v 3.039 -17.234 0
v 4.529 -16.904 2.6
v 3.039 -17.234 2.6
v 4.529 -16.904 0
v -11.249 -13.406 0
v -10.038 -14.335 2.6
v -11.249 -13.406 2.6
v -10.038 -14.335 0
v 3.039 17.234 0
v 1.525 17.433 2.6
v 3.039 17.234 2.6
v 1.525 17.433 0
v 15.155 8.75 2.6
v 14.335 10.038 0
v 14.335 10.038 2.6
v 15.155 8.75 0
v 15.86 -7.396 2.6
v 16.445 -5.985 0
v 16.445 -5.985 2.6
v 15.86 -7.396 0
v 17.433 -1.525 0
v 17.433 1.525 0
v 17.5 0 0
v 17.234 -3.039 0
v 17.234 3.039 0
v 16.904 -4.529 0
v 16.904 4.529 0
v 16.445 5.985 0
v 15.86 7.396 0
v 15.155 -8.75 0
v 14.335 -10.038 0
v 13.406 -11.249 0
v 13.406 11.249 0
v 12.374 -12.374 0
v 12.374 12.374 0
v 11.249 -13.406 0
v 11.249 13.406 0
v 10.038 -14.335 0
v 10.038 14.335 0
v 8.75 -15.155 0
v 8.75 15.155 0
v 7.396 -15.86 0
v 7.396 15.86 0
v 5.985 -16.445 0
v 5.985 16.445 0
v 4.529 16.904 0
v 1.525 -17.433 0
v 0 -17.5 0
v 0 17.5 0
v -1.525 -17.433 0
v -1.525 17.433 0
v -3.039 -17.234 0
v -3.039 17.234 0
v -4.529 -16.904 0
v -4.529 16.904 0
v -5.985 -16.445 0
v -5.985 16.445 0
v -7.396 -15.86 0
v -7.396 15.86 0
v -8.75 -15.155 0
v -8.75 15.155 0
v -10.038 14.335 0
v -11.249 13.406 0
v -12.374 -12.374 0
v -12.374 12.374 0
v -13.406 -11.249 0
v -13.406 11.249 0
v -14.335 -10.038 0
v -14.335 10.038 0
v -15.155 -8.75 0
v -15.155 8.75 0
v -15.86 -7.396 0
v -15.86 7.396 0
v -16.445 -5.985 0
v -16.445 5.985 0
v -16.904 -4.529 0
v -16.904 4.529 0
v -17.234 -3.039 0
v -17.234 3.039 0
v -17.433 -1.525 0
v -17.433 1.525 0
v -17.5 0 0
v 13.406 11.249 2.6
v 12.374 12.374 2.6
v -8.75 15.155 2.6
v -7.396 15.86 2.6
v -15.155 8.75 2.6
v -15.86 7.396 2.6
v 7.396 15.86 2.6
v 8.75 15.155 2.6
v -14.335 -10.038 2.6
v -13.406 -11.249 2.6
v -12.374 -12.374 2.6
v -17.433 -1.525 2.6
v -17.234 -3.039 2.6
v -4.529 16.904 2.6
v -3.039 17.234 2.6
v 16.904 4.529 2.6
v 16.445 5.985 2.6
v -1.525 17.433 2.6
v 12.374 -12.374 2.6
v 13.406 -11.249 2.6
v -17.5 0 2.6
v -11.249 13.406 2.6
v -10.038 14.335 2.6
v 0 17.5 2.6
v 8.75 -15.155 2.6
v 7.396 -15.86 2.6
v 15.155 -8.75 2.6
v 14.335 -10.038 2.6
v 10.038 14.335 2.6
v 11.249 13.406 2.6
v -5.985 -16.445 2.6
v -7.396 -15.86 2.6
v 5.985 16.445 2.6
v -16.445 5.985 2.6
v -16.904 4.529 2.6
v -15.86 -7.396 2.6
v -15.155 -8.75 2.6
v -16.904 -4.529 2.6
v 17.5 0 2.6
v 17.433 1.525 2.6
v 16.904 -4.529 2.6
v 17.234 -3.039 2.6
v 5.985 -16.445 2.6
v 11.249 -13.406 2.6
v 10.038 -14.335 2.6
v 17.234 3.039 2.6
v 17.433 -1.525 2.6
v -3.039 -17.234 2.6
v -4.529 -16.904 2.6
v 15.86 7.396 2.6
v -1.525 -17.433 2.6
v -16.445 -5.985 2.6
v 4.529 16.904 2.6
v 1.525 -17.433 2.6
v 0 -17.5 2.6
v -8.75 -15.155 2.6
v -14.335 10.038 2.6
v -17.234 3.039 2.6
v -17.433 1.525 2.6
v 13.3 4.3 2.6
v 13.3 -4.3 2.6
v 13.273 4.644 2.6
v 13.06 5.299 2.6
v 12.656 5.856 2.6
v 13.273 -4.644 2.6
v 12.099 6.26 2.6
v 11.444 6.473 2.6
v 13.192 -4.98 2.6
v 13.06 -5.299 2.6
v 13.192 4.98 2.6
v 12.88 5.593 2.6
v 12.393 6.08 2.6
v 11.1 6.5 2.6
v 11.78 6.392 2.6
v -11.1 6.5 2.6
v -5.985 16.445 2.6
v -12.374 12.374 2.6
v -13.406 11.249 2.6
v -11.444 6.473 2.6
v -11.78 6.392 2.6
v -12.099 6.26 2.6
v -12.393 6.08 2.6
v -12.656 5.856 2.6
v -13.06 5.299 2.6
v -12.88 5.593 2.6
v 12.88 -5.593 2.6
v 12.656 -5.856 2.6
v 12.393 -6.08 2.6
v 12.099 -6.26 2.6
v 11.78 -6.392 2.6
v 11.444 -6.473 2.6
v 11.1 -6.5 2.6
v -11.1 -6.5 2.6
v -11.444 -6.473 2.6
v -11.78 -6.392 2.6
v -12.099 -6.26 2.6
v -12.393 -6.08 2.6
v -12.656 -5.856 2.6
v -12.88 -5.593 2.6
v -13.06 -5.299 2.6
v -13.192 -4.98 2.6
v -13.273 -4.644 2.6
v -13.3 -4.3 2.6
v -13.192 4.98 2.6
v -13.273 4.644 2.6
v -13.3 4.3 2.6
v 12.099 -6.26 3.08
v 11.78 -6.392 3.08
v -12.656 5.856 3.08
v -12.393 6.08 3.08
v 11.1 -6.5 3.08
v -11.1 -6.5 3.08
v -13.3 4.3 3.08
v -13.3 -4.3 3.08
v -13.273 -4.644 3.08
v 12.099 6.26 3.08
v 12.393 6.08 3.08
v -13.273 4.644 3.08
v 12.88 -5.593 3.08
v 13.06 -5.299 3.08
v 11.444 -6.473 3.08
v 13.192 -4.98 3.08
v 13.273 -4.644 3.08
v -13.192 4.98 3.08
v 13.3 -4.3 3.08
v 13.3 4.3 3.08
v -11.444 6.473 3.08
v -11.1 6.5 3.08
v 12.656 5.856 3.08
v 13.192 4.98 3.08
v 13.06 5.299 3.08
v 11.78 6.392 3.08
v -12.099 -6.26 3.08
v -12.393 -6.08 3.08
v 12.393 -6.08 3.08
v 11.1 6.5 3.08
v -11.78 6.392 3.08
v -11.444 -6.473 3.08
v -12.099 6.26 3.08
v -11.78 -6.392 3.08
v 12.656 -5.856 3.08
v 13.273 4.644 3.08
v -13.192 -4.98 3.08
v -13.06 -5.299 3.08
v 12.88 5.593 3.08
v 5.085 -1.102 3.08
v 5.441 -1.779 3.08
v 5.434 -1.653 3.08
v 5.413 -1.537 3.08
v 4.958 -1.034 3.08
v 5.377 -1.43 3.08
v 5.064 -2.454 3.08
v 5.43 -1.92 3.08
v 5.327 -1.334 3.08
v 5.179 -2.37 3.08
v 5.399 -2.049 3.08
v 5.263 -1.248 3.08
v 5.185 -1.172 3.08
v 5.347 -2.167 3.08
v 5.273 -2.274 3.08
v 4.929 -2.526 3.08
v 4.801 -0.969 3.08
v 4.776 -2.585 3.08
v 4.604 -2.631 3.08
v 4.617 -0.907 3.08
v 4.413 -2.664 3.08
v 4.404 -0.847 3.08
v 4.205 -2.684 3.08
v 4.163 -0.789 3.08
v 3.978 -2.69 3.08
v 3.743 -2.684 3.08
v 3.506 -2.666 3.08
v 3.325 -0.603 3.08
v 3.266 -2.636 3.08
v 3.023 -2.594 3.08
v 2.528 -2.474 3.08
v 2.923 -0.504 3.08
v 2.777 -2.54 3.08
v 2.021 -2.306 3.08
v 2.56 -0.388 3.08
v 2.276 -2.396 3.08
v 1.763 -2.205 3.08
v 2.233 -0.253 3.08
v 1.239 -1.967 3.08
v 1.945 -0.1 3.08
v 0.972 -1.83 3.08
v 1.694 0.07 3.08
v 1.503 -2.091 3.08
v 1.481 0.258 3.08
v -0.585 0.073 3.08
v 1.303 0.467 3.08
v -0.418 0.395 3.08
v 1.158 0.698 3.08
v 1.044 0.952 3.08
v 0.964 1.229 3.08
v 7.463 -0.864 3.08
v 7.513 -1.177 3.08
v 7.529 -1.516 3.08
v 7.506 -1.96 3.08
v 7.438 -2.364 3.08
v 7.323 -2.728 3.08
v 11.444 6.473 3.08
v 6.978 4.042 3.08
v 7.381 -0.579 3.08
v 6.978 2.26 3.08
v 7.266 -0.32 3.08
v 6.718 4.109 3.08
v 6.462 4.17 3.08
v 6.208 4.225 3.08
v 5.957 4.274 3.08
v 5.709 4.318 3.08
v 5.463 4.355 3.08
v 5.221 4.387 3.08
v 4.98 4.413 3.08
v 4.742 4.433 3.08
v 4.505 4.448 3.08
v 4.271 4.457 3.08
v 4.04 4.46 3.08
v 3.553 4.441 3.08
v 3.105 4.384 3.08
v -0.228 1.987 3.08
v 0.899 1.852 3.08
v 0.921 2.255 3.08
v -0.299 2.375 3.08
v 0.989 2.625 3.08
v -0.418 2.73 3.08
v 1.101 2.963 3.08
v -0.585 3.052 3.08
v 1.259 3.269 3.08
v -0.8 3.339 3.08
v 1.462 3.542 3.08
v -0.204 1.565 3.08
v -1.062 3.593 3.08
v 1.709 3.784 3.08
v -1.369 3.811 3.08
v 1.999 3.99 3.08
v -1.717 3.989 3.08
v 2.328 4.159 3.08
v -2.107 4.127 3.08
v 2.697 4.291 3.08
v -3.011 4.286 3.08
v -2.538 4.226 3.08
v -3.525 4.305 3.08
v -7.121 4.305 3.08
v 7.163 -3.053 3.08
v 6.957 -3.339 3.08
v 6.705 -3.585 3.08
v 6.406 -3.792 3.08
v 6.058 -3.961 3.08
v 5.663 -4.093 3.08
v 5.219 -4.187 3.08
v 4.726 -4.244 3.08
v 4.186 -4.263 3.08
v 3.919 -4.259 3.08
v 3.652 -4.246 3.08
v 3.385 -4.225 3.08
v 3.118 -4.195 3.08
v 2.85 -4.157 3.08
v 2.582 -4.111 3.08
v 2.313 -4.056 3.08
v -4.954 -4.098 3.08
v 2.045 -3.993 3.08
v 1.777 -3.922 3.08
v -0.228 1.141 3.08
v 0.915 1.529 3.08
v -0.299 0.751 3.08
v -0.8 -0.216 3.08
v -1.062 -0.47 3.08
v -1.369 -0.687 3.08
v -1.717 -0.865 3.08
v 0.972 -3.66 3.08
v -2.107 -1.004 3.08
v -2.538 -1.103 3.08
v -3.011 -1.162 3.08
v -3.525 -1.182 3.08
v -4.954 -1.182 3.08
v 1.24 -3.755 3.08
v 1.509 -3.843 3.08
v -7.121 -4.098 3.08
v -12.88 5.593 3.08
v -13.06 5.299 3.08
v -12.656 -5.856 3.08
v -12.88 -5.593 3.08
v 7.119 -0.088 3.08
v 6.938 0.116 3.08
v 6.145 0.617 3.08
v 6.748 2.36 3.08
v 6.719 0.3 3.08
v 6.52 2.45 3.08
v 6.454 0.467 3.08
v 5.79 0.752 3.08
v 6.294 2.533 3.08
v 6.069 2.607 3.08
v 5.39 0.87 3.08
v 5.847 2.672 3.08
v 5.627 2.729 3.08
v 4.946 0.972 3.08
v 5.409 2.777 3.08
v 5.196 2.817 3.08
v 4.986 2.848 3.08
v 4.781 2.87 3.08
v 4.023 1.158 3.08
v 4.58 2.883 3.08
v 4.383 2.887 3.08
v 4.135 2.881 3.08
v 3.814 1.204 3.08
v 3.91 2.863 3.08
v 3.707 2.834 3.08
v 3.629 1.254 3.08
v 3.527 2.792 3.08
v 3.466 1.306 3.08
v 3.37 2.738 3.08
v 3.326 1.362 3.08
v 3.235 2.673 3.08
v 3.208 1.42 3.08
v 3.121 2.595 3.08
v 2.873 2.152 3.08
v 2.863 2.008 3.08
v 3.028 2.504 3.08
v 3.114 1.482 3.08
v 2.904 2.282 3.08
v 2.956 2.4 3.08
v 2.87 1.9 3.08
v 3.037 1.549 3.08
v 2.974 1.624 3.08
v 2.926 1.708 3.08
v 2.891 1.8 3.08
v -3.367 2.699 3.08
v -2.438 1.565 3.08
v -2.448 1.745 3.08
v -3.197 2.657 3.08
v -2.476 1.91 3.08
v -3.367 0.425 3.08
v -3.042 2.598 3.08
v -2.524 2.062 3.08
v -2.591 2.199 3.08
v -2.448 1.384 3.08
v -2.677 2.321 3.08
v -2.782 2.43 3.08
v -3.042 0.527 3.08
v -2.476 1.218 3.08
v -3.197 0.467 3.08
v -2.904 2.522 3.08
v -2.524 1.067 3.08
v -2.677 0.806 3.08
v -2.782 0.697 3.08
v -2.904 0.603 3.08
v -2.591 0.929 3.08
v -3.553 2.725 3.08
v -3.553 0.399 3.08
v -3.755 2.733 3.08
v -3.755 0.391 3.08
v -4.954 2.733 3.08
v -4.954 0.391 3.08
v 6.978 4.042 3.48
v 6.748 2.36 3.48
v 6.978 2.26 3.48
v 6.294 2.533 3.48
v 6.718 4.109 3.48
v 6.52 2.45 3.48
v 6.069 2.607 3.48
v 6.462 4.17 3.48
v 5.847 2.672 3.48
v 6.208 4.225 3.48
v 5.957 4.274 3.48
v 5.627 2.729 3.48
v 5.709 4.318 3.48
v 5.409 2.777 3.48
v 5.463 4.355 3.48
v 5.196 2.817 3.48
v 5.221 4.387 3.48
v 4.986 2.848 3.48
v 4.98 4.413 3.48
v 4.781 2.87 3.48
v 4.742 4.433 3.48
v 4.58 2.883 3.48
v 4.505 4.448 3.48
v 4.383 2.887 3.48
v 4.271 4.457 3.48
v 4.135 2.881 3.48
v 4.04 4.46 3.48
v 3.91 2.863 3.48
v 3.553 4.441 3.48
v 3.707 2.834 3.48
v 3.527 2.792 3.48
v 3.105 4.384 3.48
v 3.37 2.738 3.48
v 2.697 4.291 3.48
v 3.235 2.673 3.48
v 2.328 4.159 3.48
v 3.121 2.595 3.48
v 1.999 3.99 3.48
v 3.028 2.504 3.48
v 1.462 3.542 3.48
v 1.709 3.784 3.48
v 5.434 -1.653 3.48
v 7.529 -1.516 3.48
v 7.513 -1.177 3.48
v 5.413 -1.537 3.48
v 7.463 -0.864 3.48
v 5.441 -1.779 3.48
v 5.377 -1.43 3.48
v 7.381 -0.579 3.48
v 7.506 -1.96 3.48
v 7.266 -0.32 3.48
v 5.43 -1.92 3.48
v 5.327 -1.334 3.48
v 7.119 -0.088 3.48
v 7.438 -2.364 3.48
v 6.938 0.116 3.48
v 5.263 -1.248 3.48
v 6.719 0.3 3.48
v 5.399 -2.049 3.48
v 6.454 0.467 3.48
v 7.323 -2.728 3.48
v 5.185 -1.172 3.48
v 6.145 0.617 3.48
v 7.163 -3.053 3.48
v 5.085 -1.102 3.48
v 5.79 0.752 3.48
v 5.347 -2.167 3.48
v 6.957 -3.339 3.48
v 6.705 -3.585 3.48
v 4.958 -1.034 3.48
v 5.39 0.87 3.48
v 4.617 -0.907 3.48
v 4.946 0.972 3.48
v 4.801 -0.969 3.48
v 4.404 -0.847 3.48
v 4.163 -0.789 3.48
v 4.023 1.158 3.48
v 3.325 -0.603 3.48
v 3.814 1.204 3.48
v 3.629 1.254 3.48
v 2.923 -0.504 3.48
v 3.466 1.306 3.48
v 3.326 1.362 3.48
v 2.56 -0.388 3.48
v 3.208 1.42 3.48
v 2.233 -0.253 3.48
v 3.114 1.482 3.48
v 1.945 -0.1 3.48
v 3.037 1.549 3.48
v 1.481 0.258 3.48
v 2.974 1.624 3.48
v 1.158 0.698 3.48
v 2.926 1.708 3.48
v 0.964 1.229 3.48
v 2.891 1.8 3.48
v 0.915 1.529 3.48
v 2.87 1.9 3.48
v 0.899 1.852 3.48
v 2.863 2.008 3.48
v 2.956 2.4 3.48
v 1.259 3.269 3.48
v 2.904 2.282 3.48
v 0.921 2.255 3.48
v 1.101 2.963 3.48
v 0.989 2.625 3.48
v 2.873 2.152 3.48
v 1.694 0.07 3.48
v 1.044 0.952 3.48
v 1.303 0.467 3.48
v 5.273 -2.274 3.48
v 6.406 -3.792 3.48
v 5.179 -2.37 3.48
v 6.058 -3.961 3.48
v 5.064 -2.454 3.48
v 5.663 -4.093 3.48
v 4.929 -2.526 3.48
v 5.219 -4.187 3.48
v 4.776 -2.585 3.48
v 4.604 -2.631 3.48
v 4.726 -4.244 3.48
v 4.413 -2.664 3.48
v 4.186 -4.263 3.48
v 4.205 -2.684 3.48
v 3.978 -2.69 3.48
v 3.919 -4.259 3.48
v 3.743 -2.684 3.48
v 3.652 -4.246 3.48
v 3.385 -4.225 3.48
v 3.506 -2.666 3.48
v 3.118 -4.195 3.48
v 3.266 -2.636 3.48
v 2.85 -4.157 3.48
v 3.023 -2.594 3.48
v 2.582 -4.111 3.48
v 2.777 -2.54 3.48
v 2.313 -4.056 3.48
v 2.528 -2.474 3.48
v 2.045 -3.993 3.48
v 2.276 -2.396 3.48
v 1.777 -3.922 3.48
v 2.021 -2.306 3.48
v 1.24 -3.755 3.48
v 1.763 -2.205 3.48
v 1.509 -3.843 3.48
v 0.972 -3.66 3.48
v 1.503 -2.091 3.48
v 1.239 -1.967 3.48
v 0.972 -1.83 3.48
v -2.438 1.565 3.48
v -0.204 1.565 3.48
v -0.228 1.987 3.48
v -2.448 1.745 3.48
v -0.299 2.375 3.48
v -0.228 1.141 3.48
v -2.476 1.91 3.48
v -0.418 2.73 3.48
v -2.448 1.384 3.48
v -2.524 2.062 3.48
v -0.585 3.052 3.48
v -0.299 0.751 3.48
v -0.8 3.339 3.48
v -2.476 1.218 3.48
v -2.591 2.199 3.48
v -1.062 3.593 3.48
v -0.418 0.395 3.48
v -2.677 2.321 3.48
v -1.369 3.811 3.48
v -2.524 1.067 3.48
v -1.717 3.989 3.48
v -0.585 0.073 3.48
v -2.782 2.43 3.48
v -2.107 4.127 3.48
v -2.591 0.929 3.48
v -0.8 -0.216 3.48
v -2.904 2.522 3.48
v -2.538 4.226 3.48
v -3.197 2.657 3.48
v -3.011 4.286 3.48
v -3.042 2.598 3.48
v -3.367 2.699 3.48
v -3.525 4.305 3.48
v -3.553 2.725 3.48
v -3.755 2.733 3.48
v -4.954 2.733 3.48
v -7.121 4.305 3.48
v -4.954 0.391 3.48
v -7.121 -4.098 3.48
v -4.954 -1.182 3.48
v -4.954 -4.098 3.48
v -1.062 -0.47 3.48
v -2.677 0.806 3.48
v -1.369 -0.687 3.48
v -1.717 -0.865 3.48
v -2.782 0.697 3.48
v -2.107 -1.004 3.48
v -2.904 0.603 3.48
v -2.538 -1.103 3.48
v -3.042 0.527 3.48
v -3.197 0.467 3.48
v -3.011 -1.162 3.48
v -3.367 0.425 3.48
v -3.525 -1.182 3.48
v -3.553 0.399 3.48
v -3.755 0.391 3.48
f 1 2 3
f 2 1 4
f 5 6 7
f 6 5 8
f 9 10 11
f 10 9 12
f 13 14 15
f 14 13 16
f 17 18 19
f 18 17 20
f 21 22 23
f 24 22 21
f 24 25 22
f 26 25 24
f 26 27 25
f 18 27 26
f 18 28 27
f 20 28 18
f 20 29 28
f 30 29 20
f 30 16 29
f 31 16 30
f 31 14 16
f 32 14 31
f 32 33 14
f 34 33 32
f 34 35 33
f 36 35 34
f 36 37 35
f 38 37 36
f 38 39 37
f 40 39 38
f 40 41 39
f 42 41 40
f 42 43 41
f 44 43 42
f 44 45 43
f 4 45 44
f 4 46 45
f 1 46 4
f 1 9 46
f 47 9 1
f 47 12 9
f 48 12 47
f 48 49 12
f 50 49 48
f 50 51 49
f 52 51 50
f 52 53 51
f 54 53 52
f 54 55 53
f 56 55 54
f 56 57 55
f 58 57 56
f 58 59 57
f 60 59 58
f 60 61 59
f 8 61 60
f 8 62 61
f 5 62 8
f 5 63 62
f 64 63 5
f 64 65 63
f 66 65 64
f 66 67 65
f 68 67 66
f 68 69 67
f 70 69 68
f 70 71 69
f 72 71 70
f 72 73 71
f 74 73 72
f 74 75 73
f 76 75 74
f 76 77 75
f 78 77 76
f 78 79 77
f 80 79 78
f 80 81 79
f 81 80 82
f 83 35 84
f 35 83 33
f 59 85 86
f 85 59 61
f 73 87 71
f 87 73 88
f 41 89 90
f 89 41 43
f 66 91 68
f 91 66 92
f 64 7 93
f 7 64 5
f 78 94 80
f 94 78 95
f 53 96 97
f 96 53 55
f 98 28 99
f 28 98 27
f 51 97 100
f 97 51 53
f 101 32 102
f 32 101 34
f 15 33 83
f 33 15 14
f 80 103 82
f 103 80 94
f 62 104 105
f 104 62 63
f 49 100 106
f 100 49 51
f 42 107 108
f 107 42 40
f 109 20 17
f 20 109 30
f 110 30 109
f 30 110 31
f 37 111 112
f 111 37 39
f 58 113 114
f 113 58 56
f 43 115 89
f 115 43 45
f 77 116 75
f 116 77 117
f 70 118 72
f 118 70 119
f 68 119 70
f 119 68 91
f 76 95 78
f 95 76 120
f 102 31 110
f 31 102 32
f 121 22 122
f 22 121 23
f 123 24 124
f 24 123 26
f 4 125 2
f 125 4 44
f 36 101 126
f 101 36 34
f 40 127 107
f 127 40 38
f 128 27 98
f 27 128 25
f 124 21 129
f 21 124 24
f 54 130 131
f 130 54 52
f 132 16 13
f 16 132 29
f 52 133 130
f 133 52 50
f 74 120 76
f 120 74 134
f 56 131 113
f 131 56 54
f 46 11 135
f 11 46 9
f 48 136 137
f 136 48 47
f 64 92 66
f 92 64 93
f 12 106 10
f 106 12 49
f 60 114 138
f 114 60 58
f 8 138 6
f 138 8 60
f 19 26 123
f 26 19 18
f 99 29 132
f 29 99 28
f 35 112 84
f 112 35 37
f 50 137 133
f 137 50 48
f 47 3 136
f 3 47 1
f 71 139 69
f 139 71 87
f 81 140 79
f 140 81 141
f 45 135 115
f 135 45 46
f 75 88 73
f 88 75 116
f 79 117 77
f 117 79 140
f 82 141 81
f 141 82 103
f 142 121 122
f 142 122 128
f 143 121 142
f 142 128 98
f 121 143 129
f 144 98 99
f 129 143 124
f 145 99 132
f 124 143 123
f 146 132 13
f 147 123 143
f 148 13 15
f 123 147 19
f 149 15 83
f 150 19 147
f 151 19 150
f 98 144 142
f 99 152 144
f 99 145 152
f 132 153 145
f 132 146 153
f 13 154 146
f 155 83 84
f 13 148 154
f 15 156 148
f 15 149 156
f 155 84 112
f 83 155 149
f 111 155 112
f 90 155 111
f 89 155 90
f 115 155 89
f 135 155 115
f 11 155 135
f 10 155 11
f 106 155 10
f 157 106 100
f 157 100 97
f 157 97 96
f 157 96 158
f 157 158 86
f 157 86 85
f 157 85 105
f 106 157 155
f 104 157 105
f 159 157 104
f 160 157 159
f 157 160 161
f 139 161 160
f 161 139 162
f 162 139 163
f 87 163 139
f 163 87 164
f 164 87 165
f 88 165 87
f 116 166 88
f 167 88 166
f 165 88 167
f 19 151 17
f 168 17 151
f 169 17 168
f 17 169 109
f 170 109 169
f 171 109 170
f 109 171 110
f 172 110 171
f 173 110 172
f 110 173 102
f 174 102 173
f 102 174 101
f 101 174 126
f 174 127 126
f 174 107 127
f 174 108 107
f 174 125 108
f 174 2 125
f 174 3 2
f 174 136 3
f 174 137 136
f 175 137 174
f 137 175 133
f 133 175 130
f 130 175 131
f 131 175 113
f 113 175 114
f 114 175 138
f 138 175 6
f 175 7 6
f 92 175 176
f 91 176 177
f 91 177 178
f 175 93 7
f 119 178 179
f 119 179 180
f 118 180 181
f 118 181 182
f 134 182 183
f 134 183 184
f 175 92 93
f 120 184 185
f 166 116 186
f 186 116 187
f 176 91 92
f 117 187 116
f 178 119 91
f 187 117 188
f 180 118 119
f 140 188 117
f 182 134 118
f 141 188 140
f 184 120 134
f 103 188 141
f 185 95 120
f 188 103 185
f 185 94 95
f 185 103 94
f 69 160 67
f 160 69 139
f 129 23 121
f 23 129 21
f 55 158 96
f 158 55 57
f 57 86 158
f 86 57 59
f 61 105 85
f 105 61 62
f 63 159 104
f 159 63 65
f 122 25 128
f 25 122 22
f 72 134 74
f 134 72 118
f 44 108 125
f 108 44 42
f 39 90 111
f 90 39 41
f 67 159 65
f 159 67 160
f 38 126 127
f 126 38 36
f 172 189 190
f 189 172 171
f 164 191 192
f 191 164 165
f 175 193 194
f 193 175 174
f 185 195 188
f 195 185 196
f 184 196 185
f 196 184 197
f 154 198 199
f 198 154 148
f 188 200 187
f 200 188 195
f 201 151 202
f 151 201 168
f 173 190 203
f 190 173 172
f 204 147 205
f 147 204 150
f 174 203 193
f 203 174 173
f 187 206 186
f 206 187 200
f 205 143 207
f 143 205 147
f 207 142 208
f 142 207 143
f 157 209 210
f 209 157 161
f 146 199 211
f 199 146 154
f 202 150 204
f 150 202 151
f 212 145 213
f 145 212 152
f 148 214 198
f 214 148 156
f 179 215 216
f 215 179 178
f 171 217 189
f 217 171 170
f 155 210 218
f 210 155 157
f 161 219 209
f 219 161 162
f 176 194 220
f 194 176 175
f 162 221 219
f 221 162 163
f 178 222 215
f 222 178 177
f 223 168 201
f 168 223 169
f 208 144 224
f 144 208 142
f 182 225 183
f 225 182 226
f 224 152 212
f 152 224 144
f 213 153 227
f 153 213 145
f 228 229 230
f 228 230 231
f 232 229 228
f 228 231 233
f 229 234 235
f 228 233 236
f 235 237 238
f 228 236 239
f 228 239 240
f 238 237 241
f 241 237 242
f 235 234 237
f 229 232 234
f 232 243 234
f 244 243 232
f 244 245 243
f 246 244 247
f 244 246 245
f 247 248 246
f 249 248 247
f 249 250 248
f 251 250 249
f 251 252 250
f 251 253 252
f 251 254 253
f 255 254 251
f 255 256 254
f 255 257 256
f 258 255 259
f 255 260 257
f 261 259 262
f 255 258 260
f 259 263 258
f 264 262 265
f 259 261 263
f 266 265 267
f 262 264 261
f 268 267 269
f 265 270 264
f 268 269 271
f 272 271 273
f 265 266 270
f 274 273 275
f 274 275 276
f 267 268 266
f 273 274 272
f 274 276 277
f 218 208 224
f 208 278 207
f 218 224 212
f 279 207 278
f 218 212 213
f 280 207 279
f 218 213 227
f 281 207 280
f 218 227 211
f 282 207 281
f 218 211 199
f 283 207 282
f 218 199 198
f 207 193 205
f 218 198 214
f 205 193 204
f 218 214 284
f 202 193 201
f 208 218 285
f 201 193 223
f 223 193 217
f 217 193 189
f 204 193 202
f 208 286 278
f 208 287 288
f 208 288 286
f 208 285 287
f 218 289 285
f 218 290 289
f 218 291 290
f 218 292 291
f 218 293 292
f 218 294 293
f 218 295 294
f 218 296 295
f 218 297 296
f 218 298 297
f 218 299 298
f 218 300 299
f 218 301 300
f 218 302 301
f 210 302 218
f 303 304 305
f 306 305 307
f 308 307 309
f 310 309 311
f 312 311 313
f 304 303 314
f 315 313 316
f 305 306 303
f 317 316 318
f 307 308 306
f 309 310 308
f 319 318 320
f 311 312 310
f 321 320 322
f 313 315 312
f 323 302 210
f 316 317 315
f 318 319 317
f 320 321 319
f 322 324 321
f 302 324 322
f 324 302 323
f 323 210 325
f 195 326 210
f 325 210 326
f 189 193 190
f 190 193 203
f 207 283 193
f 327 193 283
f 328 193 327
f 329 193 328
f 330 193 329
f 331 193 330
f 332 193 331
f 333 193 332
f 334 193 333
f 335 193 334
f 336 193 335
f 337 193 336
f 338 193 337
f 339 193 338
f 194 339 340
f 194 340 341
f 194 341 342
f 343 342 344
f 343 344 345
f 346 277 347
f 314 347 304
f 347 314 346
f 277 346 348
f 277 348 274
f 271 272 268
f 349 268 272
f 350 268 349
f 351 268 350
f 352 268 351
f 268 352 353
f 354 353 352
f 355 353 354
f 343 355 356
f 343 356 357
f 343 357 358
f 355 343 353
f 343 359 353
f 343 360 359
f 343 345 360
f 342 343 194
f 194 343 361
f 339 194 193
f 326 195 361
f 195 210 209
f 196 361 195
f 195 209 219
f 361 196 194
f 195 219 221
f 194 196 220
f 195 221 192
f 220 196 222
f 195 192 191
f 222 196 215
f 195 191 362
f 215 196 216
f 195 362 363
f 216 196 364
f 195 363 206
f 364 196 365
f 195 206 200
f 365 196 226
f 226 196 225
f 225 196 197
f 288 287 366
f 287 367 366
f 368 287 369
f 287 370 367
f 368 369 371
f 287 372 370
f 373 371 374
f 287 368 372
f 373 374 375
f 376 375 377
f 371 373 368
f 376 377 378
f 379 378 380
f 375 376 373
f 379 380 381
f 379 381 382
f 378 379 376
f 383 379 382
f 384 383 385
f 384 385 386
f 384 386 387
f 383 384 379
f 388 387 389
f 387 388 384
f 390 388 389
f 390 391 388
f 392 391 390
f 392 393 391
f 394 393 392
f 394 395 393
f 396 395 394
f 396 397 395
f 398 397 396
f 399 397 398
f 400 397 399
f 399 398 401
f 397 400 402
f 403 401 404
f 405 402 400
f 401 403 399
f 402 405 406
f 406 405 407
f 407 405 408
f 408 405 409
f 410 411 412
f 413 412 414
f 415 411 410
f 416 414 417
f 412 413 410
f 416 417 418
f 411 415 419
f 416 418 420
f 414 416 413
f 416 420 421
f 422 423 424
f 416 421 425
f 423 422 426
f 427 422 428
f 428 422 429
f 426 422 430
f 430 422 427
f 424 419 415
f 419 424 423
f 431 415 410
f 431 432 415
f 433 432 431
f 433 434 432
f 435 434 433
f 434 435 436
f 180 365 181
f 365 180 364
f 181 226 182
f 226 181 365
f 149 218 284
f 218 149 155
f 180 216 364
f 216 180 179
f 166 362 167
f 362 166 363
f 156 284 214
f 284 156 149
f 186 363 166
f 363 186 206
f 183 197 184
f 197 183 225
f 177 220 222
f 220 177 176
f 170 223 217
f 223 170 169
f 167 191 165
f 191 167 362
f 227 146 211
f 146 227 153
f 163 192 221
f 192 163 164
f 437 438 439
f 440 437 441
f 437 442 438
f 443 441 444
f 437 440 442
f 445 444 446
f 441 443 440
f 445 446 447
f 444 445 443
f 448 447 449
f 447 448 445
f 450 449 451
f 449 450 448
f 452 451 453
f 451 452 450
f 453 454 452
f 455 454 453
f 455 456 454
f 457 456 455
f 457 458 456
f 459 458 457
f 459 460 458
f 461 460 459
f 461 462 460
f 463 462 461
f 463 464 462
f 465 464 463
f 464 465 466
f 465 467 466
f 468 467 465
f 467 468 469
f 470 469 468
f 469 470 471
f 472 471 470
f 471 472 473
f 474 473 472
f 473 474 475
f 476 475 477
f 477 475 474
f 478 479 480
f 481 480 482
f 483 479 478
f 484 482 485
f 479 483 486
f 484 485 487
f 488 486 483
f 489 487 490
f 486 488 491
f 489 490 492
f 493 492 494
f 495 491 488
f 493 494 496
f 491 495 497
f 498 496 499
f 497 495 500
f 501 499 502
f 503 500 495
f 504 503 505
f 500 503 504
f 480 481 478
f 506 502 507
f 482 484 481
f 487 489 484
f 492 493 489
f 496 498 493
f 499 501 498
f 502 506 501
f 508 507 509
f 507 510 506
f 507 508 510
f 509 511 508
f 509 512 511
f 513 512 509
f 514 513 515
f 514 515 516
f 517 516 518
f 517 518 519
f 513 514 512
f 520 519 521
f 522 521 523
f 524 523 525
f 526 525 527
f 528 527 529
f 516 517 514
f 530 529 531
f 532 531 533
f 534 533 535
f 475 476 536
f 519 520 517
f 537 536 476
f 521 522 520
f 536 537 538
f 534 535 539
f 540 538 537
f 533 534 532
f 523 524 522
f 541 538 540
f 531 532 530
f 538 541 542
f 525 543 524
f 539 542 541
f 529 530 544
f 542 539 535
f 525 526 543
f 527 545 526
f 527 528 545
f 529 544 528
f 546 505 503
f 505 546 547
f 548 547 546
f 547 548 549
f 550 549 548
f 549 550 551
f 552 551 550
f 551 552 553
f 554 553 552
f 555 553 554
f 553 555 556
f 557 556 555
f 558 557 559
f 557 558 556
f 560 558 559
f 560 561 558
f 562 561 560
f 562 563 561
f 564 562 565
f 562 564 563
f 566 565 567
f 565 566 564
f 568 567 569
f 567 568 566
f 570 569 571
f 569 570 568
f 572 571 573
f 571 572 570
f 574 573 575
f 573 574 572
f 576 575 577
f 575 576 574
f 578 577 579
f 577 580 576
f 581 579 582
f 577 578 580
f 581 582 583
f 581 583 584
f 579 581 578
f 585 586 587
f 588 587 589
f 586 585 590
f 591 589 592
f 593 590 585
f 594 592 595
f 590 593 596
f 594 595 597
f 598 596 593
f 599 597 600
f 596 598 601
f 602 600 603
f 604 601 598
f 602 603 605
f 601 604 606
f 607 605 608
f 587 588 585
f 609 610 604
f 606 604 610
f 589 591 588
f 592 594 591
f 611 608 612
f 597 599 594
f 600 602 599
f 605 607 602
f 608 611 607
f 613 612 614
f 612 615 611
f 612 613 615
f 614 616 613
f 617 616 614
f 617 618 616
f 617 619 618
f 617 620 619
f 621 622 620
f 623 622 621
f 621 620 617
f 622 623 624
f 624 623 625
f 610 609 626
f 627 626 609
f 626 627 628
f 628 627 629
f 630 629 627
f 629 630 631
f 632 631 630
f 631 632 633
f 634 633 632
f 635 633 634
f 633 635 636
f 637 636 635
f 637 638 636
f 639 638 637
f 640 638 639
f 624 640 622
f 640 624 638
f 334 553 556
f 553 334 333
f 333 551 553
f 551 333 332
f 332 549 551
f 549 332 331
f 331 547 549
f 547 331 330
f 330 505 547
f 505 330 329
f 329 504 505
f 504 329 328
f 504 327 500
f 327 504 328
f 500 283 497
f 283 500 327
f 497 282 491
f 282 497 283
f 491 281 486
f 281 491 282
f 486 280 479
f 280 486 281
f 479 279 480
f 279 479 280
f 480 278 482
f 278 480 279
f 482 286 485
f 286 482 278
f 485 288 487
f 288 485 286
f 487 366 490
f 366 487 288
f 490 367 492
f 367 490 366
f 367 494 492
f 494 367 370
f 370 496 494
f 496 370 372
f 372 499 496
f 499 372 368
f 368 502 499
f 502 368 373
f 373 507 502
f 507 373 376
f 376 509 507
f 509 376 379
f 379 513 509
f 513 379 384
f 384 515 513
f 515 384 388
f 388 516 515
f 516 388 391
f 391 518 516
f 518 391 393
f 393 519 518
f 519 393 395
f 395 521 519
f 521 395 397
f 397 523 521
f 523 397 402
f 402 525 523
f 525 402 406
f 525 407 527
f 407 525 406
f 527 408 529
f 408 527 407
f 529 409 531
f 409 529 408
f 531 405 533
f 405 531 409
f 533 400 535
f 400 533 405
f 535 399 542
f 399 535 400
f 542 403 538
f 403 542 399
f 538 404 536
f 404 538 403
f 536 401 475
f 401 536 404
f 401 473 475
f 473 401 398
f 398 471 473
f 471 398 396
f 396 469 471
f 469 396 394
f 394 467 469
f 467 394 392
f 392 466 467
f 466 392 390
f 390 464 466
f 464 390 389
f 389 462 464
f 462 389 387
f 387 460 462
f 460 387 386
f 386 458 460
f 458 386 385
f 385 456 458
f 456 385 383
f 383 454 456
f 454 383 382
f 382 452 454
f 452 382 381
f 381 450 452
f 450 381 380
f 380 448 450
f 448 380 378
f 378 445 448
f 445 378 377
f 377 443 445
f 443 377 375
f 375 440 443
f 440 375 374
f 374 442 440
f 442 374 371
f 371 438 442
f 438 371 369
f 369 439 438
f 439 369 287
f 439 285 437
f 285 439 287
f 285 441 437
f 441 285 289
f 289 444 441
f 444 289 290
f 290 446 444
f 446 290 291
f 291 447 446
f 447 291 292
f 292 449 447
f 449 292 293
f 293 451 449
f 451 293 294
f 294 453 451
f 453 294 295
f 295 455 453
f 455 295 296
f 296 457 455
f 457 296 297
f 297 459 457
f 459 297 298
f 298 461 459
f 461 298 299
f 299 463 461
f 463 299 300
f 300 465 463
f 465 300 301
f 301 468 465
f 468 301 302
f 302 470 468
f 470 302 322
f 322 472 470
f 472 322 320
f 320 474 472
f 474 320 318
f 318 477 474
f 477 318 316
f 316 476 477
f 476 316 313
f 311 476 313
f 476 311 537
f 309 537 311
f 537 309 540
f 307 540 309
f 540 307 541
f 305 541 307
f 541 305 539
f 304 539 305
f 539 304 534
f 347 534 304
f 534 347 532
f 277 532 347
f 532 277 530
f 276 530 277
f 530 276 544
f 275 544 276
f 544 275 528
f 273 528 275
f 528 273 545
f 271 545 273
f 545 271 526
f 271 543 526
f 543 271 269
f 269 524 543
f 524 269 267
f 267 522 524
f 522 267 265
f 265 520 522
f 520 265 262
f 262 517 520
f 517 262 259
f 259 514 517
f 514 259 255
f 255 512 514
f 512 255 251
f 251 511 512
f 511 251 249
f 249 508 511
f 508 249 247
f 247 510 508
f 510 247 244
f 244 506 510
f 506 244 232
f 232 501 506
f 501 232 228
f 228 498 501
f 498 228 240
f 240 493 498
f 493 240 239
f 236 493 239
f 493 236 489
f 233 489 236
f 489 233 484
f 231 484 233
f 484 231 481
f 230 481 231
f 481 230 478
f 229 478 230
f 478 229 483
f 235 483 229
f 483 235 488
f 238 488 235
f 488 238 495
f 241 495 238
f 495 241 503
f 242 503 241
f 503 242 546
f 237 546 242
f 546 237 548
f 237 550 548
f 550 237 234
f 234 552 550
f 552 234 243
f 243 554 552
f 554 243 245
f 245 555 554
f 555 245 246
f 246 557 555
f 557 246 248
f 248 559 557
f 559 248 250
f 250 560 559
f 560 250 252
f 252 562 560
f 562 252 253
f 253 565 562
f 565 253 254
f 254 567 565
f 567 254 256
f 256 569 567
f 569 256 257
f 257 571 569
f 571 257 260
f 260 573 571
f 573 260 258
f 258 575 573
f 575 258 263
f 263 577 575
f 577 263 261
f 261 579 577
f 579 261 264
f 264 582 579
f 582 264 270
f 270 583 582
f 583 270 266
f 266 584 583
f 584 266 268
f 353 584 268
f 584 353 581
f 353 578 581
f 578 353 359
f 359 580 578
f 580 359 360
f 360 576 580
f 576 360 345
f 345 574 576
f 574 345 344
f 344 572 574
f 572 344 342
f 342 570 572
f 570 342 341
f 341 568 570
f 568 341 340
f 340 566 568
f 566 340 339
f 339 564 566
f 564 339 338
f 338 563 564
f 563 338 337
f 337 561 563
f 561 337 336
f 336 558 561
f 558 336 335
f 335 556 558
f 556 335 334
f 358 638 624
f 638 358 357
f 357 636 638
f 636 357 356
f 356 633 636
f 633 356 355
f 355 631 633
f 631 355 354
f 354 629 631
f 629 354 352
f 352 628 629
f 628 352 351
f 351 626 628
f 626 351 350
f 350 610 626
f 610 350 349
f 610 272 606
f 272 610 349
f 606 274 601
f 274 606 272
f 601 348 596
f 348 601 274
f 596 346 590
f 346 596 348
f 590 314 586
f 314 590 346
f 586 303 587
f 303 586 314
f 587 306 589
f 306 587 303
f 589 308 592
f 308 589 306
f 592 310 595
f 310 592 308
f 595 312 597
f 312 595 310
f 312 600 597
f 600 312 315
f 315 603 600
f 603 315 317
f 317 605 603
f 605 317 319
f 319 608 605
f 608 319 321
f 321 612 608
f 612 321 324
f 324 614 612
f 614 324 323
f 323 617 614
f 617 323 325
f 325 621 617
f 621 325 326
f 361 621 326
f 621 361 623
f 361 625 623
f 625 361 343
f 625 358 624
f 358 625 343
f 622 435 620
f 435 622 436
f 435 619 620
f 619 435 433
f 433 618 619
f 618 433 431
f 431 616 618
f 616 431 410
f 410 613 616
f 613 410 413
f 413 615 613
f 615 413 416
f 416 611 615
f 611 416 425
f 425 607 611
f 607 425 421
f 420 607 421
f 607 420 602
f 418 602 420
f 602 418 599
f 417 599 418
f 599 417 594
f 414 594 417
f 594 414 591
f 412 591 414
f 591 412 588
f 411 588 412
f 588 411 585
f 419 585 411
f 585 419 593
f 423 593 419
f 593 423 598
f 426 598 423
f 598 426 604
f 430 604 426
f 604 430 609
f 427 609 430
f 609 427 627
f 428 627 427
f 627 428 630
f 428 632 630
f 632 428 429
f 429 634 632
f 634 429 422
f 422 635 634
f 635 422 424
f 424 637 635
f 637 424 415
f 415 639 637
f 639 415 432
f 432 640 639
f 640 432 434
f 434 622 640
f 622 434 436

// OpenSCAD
// POLSOLIDE — Żeton okrągły
// Materiały: base=czarny (#18181B); red=czerwony (#B7131C); white=biały (#F1F0EC).
// Zapisz do STL: openscad -o element.stl -D 'part="base"' tenplik.scad
// Model na płasko: wszystkie barwy zmieniają się tylko na samym końcu druku.
$fn=40;
part="all"; // all, base, red, white
W=35; H=35; T=2.6; kind="coin";
RH=0.48; WH=0.40; // wysokość czerwonego i białego detalowania
magnet=false;
label=""; // zmień np. numer lokalu, oznaczenie stanowiska lub pomieszczenia

module rr(w,h,r){offset(r=r) square([max(0.1,w-2*r),max(0.1,h-2*r)],center=true);}
module outline(){
 if(kind=="house")polygon(points=[[-W/2,-H/2],[W/2,-H/2],[W/2,H*.13],[0,H/2],[-W/2,H*.13]]);
 else if(kind=="shield")polygon(points=[[-W*.46,H*.48],[W*.46,H*.48],[W*.49,-H*.05],[W*.25,-H*.32],[0,-H*.49],[-W*.25,-H*.32],[-W*.49,-H*.05]]);
 else if(kind=="hex")polygon(points=[[-W*.35,-H/2],[W*.35,-H/2],[W/2,0],[W*.35,H/2],[-W*.35,H/2],[-W/2,0]]);
 else if(kind=="oval")scale([W/2,H/2])circle(r=1,$fn=60);
 else if(kind=="coin")circle(d=W,$fn=72);
 else if(kind=="plaque")rr(W,H,3.0);
 else if(kind=="luggage")rr(W,H,6.5);
 else if(kind=="arch")union(){translate([0,-H*.10])rr(W,H*.8,5);translate([0,H*.14])scale([W/2,H*.37])circle(r=1,$fn=48);}
 else if(kind=="key") union(){translate([-W*.3,0])circle(d=H,$fn=48);translate([W*.08,-H*.16])square([W*.68,H*.32],center=true);translate([W*.31,-H*.27])square([W*.11,H*.20],center=true);translate([W*.42,-H*.27])square([W*.09,H*.20],center=true);}
 else if(kind=="tag")union(){rr(W-7,H,5);translate([-W/2+5,0])circle(d=H*.78,$fn=48);}
 else rr(W,H,5);
}
module hole2d(){
 if(kind=="house")translate([0,H*.29])circle(d=4.6,$fn=40);
 else if(kind=="shield")translate([0,H*.34])circle(d=4.6,$fn=40);
 else if(kind=="key")translate([-W*.3,0])circle(d=4.6,$fn=40);
 else if(kind=="oval" && !magnet)translate([-W*.34,0])circle(d=4.6,$fn=40);
 else if(kind=="tag")translate([-W*.36,0])circle(d=4.6,$fn=40);
 else if(kind=="luggage")translate([-W*.40,0])circle(d=5,$fn=40);
}
module footprint(){difference(){outline(); if(!magnet)hole2d();}}
// W małych produktach monogram PS jest większy i czytelniejszy przy dyszy 0.4 mm.
small=(W<=50 || kind=="coin" || kind=="hex");
bw= min(W*.76,64);
bh=(label=="")?(small?13:15):20;
// dla breloka w kształcie klucza środek znaku przesunięto od oczka
badgeX=(kind=="key")?W*.13:(kind=="oval"&&!magnet?W*.055:(kind=="tag"?W*.07:(kind=="luggage"?W*.03:0)));
badgeY=(kind=="house" || kind=="shield")?-H*.10:0;
module brand_patch(){translate([badgeX,badgeY])rr(bw,bh,2.2);}
module base_black(){difference(){linear_extrude(height=T,convexity=8)footprint();
 if(magnet)translate([0,0,-0.02])cylinder(h=2.14,d=10.35,$fn=48);
}}
module red_cap(){translate([0,0,T])linear_extrude(height=RH)intersection(){offset(delta=-.55)footprint();brand_patch();}}
module white_brand(){
 translate([badgeX,badgeY,T+RH])linear_extrude(height=WH)
 if(label!="") {
   translate([0,3.8])text("POLSOLIDE",font="DejaVu Sans:style=Bold",size=min(4.0,bw*.087),halign="center",valign="center");
   translate([0,-4.0])text(label,font="DejaVu Sans:style=Bold",size=min(6.4,bw/(max(2,len(label))*0.75)),halign="center",valign="center");
 }
 else if(small) text("PS",font="DejaVu Sans:style=Bold",size=8.3,halign="center",valign="center");
 else text("POLSOLIDE",font="DejaVu Sans:style=Bold",size=min(6.4,bw*.127),halign="center",valign="center");
}
if(part=="all"||part=="base")color([.094,.094,.106])base_black();
if(part=="all"||part=="red")color([.718,.075,.11])red_cap();
if(part=="all"||part=="white")color([.945,.941,.925])white_brand();
